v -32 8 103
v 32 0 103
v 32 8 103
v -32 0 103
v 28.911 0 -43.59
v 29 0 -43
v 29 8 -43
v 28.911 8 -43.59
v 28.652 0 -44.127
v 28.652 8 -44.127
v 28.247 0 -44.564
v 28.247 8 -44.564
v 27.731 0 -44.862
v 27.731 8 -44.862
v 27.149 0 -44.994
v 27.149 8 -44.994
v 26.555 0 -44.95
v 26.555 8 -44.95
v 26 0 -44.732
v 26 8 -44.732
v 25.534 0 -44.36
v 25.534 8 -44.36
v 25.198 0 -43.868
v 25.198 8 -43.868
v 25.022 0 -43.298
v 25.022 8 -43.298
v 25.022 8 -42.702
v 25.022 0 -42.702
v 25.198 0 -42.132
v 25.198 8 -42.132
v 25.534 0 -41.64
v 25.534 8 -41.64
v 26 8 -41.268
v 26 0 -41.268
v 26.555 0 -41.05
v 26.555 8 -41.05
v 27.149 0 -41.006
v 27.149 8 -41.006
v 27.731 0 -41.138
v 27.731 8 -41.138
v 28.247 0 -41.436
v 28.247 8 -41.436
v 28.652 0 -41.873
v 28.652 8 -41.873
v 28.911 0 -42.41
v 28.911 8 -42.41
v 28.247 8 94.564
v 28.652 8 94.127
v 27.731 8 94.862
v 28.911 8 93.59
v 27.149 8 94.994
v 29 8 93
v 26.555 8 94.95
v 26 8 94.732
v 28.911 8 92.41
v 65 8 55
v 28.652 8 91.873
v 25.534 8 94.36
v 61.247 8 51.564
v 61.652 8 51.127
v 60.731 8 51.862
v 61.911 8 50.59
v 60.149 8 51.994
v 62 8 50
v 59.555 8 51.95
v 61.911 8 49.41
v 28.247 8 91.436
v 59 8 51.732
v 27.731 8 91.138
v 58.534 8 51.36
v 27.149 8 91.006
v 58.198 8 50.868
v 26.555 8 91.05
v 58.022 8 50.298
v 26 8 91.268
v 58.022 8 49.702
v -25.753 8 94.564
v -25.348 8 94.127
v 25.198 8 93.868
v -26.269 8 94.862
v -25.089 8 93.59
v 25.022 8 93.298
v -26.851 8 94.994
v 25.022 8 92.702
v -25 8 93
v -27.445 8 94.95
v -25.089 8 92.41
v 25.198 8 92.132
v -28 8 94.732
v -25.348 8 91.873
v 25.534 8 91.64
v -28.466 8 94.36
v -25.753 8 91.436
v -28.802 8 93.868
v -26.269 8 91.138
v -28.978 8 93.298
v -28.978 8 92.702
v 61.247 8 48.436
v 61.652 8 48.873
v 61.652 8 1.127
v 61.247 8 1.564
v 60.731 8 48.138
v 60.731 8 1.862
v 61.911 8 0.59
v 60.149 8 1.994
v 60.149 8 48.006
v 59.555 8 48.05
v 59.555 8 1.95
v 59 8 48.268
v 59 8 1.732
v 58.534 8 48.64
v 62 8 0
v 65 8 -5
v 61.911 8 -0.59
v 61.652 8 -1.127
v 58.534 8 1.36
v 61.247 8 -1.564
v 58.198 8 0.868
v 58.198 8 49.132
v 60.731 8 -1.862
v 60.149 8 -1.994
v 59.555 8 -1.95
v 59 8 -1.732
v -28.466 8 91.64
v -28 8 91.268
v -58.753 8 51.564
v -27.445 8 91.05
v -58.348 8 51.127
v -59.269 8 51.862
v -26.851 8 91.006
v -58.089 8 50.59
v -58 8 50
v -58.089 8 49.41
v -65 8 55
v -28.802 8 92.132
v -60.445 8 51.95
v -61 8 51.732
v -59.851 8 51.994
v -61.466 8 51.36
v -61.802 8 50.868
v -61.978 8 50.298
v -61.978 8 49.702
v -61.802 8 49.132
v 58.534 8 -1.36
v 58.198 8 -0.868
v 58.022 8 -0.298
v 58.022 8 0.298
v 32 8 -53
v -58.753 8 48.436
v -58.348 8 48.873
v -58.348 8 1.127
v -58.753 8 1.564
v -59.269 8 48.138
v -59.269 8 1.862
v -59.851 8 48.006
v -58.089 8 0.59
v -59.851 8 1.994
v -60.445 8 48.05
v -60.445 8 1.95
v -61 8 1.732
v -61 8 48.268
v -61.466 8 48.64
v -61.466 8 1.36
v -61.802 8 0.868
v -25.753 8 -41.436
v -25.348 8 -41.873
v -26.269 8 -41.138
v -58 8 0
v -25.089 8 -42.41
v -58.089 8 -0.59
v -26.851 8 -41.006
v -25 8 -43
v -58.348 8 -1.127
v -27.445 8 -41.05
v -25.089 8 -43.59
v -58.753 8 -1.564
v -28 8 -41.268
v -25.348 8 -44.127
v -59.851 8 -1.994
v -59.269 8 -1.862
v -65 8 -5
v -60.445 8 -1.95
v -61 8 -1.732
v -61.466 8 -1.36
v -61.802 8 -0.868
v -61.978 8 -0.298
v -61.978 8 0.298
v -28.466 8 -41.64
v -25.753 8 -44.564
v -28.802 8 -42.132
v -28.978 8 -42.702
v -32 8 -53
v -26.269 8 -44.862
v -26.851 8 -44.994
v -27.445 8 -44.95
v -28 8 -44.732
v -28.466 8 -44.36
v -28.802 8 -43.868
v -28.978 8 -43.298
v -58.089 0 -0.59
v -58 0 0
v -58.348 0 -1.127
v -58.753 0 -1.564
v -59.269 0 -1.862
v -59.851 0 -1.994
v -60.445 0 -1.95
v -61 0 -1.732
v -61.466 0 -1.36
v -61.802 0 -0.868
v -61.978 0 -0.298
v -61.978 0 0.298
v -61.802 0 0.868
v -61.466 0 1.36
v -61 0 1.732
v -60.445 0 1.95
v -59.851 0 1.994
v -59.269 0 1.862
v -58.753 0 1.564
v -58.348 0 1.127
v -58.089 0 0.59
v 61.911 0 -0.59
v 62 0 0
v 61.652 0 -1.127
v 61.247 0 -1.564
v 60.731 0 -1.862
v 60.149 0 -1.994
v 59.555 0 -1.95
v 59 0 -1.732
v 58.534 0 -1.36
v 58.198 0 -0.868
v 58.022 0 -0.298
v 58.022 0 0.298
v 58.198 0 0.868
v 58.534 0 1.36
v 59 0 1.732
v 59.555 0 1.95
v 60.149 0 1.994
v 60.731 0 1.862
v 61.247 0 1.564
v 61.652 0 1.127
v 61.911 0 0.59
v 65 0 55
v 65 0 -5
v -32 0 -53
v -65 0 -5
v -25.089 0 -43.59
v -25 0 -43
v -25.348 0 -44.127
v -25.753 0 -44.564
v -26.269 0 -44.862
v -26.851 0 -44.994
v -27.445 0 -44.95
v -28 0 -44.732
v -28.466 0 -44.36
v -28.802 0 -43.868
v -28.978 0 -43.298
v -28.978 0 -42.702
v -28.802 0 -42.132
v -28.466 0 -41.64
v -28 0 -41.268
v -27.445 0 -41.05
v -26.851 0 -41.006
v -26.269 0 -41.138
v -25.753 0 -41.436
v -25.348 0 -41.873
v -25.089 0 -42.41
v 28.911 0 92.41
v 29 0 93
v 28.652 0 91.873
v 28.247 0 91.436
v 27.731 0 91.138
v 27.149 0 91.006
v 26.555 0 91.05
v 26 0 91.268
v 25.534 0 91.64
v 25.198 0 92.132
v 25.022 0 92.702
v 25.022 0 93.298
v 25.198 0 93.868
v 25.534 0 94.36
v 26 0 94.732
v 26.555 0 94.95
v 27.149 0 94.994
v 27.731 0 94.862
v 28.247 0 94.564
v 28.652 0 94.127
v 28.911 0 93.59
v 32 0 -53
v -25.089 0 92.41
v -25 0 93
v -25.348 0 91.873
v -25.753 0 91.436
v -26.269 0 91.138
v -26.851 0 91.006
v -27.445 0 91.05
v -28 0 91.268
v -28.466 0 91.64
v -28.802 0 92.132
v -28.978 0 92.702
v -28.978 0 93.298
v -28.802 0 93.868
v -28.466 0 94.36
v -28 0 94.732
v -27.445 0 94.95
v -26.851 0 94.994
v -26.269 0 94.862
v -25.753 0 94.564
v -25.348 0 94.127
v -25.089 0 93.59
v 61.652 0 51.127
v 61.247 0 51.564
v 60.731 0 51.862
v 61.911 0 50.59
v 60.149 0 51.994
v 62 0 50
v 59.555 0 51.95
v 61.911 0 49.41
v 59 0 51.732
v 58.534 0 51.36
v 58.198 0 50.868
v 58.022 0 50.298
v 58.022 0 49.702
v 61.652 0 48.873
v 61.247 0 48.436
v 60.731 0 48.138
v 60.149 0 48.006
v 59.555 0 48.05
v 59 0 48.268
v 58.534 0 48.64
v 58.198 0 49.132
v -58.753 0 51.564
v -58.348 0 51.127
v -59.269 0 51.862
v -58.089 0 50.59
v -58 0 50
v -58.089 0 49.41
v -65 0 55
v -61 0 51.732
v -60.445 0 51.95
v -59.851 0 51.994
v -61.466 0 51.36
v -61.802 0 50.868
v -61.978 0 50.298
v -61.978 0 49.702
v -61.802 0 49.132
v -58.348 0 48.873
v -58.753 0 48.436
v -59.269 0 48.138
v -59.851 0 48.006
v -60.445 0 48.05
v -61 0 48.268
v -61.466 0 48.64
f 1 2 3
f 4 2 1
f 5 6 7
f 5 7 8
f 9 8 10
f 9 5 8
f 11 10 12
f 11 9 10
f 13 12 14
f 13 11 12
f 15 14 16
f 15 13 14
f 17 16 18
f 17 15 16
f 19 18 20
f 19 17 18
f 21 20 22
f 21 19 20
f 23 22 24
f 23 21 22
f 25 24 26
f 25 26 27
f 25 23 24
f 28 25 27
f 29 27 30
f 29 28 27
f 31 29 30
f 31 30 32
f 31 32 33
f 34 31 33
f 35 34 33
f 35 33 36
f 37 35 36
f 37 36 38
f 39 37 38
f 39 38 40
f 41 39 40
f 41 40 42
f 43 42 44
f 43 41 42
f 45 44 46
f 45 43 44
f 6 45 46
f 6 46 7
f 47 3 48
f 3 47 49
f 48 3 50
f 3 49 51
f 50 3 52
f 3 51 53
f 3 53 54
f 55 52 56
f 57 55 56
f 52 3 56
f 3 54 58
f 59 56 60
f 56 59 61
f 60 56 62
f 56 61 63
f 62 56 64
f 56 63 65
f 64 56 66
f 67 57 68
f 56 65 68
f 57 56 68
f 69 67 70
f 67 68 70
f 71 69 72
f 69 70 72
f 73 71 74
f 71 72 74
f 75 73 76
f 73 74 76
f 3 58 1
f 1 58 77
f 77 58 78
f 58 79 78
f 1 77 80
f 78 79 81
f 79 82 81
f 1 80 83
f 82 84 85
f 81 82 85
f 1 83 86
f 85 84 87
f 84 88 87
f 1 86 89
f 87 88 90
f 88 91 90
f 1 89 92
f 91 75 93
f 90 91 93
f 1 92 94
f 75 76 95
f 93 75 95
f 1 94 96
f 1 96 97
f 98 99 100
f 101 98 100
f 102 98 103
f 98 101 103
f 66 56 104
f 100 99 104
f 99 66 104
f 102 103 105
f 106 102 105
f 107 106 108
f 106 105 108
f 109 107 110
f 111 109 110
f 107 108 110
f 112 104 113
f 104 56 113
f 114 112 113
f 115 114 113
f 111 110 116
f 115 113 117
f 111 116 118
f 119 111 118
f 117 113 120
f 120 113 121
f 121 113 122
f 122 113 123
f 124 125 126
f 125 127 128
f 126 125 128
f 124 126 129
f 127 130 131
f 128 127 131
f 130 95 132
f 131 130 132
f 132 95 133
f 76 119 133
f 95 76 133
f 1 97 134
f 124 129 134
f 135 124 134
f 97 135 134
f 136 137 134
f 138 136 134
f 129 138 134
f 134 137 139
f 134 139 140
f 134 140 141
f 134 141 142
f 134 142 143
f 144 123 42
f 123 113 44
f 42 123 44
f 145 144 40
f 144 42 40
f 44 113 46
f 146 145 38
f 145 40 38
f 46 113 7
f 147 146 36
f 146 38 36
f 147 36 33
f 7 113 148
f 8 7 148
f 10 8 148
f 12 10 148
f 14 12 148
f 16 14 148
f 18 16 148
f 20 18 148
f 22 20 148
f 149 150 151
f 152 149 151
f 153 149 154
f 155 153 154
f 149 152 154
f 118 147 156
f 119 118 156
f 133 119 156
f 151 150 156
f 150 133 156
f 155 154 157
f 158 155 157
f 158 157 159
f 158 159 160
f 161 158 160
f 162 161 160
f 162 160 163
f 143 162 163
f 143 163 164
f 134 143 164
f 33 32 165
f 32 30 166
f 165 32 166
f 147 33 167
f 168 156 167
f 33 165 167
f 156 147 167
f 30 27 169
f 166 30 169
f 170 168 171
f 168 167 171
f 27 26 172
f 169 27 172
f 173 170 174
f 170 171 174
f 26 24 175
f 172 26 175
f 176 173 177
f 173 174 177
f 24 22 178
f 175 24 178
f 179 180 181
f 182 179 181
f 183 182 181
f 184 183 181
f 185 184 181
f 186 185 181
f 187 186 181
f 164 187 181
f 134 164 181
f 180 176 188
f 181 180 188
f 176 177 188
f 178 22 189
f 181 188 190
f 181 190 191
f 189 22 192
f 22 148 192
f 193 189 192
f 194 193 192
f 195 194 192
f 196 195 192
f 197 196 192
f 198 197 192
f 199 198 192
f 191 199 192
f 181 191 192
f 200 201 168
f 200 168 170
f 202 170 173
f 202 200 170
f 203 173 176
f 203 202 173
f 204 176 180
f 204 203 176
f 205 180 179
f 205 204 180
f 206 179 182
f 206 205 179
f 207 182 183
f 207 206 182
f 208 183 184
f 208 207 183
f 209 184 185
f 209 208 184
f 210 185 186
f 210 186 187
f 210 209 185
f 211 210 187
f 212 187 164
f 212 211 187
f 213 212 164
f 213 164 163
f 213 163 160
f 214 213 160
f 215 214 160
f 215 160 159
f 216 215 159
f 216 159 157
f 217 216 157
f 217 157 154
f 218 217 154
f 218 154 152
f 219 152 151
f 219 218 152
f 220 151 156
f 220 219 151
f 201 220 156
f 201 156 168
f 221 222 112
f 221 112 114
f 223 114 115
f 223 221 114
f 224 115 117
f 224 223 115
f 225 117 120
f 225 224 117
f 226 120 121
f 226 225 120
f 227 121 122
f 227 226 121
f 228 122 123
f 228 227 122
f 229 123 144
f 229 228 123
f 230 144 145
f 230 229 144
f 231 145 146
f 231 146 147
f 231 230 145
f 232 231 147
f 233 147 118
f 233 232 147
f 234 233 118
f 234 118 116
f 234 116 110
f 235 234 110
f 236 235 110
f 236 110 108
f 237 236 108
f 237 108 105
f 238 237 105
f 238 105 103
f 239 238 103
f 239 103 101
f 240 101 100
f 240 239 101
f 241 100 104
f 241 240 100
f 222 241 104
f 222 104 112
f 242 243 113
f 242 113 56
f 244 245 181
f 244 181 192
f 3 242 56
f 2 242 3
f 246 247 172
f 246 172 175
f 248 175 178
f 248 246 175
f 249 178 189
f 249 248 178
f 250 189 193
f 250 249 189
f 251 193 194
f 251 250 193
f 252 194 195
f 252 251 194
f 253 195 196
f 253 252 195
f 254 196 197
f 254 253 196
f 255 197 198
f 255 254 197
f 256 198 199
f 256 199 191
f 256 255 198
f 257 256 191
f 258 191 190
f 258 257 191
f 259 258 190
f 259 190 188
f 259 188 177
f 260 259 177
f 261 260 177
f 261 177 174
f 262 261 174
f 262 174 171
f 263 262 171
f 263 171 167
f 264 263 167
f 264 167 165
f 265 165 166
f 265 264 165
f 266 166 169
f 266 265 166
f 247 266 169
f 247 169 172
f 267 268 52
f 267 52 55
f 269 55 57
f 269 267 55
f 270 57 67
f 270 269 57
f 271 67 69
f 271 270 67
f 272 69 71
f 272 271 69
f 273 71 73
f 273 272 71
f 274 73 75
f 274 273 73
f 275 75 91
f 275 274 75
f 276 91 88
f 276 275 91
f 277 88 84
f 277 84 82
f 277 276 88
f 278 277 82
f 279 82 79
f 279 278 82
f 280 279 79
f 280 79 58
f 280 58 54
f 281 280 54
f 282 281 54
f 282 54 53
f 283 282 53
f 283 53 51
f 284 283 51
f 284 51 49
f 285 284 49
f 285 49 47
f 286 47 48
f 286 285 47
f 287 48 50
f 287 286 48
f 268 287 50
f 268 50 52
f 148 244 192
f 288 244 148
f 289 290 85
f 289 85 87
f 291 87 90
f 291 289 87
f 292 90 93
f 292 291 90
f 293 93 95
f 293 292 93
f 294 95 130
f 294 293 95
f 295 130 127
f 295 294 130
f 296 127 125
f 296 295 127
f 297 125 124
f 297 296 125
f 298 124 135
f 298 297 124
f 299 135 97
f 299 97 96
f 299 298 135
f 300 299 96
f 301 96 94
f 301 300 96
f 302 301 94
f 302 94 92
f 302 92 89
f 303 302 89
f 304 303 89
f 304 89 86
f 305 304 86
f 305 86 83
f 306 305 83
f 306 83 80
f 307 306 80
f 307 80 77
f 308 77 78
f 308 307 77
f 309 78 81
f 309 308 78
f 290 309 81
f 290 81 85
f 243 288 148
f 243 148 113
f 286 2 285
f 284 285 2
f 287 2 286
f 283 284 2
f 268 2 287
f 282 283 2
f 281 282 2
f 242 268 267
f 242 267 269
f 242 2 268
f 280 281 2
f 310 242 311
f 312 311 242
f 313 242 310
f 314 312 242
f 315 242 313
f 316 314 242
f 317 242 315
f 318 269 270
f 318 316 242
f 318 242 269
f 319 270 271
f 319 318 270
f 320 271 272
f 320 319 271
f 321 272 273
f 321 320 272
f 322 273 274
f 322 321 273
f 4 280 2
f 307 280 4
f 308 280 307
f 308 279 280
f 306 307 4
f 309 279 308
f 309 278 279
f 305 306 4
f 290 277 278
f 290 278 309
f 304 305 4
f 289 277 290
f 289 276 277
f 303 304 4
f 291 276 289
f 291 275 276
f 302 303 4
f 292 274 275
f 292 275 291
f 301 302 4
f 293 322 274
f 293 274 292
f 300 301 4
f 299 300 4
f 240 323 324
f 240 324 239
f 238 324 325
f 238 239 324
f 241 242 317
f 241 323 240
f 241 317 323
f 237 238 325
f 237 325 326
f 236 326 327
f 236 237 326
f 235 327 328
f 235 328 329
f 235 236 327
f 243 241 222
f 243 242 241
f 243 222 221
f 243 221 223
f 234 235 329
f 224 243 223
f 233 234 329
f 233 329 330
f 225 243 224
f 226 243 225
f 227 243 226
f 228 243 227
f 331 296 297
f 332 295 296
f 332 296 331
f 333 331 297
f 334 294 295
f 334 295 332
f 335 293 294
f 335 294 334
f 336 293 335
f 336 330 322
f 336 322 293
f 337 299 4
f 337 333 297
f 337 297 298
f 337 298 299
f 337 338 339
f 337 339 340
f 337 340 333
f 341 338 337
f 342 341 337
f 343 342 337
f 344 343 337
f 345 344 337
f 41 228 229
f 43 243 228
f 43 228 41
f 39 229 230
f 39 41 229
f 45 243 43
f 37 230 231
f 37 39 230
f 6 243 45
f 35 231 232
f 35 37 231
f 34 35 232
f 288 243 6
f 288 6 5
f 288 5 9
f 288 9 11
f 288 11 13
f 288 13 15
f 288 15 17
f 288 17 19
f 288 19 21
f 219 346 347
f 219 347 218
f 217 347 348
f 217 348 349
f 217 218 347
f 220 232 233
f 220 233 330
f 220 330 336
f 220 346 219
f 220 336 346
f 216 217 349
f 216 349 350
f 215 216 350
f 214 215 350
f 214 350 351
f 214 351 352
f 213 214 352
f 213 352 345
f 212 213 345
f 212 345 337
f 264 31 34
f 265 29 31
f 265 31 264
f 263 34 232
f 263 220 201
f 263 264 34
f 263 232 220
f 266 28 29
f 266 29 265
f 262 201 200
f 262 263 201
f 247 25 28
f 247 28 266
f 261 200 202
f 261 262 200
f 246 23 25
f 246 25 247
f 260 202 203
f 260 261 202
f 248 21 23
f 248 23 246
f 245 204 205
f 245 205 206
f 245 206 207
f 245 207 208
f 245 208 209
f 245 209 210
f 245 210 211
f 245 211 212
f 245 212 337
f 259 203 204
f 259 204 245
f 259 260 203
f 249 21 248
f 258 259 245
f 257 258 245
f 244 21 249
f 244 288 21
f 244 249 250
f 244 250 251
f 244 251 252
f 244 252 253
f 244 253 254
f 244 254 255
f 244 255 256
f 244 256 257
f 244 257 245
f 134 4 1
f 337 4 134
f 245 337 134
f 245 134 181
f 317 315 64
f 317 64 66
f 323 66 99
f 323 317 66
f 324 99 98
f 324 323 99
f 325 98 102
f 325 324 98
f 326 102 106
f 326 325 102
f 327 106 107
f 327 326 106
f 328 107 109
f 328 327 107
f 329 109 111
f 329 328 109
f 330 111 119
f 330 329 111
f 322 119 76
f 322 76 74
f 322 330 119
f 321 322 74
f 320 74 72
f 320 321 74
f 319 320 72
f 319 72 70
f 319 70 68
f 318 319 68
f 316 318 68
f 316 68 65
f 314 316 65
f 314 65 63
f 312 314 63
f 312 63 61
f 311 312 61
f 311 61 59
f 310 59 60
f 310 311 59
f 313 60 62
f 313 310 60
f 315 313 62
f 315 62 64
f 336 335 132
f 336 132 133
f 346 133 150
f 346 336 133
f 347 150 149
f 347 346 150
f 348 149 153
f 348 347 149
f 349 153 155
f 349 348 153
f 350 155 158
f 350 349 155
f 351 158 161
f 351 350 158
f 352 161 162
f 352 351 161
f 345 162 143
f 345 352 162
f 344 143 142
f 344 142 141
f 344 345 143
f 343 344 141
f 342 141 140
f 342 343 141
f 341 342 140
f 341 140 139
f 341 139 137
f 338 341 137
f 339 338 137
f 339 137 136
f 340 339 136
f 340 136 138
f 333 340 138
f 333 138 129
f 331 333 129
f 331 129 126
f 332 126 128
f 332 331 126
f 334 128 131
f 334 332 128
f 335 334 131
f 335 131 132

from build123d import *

# Parameters (mm, degrees)
SKETCH_1_R      = 2
EXTRUDE_1_DEPTH = 8


with BuildPart() as part:
    # 草图1 → 凸台-拉伸1 (new body)
    with BuildSketch(Plane(origin=(0, 0, 0), x_dir=(1, 0, 0), z_dir=(0, 1, 0))):
        Polygon((32, 53), (65, 5), (65, -55), (32, -103), (-32, -103), (-65, -55), (-65, 5), (-32, 53), align=None)
        with Locations((27, -93)):
            Circle(SKETCH_1_R, mode=Mode.SUBTRACT)
        with Locations((27, 43)):
            Circle(SKETCH_1_R, mode=Mode.SUBTRACT)
        with Locations((60, 0)):
            Circle(SKETCH_1_R, mode=Mode.SUBTRACT)
        with Locations((60, -50)):
            Circle(SKETCH_1_R, mode=Mode.SUBTRACT)
        with Locations((-27, -93)):
            Circle(SKETCH_1_R, mode=Mode.SUBTRACT)
        with Locations((-60, -50)):
            Circle(SKETCH_1_R, mode=Mode.SUBTRACT)
        with Locations((-60, 0)):
            Circle(SKETCH_1_R, mode=Mode.SUBTRACT)
        with Locations((-27, 43)):
            Circle(SKETCH_1_R, mode=Mode.SUBTRACT)
    extrude(amount=EXTRUDE_1_DEPTH)


solid = part.part
